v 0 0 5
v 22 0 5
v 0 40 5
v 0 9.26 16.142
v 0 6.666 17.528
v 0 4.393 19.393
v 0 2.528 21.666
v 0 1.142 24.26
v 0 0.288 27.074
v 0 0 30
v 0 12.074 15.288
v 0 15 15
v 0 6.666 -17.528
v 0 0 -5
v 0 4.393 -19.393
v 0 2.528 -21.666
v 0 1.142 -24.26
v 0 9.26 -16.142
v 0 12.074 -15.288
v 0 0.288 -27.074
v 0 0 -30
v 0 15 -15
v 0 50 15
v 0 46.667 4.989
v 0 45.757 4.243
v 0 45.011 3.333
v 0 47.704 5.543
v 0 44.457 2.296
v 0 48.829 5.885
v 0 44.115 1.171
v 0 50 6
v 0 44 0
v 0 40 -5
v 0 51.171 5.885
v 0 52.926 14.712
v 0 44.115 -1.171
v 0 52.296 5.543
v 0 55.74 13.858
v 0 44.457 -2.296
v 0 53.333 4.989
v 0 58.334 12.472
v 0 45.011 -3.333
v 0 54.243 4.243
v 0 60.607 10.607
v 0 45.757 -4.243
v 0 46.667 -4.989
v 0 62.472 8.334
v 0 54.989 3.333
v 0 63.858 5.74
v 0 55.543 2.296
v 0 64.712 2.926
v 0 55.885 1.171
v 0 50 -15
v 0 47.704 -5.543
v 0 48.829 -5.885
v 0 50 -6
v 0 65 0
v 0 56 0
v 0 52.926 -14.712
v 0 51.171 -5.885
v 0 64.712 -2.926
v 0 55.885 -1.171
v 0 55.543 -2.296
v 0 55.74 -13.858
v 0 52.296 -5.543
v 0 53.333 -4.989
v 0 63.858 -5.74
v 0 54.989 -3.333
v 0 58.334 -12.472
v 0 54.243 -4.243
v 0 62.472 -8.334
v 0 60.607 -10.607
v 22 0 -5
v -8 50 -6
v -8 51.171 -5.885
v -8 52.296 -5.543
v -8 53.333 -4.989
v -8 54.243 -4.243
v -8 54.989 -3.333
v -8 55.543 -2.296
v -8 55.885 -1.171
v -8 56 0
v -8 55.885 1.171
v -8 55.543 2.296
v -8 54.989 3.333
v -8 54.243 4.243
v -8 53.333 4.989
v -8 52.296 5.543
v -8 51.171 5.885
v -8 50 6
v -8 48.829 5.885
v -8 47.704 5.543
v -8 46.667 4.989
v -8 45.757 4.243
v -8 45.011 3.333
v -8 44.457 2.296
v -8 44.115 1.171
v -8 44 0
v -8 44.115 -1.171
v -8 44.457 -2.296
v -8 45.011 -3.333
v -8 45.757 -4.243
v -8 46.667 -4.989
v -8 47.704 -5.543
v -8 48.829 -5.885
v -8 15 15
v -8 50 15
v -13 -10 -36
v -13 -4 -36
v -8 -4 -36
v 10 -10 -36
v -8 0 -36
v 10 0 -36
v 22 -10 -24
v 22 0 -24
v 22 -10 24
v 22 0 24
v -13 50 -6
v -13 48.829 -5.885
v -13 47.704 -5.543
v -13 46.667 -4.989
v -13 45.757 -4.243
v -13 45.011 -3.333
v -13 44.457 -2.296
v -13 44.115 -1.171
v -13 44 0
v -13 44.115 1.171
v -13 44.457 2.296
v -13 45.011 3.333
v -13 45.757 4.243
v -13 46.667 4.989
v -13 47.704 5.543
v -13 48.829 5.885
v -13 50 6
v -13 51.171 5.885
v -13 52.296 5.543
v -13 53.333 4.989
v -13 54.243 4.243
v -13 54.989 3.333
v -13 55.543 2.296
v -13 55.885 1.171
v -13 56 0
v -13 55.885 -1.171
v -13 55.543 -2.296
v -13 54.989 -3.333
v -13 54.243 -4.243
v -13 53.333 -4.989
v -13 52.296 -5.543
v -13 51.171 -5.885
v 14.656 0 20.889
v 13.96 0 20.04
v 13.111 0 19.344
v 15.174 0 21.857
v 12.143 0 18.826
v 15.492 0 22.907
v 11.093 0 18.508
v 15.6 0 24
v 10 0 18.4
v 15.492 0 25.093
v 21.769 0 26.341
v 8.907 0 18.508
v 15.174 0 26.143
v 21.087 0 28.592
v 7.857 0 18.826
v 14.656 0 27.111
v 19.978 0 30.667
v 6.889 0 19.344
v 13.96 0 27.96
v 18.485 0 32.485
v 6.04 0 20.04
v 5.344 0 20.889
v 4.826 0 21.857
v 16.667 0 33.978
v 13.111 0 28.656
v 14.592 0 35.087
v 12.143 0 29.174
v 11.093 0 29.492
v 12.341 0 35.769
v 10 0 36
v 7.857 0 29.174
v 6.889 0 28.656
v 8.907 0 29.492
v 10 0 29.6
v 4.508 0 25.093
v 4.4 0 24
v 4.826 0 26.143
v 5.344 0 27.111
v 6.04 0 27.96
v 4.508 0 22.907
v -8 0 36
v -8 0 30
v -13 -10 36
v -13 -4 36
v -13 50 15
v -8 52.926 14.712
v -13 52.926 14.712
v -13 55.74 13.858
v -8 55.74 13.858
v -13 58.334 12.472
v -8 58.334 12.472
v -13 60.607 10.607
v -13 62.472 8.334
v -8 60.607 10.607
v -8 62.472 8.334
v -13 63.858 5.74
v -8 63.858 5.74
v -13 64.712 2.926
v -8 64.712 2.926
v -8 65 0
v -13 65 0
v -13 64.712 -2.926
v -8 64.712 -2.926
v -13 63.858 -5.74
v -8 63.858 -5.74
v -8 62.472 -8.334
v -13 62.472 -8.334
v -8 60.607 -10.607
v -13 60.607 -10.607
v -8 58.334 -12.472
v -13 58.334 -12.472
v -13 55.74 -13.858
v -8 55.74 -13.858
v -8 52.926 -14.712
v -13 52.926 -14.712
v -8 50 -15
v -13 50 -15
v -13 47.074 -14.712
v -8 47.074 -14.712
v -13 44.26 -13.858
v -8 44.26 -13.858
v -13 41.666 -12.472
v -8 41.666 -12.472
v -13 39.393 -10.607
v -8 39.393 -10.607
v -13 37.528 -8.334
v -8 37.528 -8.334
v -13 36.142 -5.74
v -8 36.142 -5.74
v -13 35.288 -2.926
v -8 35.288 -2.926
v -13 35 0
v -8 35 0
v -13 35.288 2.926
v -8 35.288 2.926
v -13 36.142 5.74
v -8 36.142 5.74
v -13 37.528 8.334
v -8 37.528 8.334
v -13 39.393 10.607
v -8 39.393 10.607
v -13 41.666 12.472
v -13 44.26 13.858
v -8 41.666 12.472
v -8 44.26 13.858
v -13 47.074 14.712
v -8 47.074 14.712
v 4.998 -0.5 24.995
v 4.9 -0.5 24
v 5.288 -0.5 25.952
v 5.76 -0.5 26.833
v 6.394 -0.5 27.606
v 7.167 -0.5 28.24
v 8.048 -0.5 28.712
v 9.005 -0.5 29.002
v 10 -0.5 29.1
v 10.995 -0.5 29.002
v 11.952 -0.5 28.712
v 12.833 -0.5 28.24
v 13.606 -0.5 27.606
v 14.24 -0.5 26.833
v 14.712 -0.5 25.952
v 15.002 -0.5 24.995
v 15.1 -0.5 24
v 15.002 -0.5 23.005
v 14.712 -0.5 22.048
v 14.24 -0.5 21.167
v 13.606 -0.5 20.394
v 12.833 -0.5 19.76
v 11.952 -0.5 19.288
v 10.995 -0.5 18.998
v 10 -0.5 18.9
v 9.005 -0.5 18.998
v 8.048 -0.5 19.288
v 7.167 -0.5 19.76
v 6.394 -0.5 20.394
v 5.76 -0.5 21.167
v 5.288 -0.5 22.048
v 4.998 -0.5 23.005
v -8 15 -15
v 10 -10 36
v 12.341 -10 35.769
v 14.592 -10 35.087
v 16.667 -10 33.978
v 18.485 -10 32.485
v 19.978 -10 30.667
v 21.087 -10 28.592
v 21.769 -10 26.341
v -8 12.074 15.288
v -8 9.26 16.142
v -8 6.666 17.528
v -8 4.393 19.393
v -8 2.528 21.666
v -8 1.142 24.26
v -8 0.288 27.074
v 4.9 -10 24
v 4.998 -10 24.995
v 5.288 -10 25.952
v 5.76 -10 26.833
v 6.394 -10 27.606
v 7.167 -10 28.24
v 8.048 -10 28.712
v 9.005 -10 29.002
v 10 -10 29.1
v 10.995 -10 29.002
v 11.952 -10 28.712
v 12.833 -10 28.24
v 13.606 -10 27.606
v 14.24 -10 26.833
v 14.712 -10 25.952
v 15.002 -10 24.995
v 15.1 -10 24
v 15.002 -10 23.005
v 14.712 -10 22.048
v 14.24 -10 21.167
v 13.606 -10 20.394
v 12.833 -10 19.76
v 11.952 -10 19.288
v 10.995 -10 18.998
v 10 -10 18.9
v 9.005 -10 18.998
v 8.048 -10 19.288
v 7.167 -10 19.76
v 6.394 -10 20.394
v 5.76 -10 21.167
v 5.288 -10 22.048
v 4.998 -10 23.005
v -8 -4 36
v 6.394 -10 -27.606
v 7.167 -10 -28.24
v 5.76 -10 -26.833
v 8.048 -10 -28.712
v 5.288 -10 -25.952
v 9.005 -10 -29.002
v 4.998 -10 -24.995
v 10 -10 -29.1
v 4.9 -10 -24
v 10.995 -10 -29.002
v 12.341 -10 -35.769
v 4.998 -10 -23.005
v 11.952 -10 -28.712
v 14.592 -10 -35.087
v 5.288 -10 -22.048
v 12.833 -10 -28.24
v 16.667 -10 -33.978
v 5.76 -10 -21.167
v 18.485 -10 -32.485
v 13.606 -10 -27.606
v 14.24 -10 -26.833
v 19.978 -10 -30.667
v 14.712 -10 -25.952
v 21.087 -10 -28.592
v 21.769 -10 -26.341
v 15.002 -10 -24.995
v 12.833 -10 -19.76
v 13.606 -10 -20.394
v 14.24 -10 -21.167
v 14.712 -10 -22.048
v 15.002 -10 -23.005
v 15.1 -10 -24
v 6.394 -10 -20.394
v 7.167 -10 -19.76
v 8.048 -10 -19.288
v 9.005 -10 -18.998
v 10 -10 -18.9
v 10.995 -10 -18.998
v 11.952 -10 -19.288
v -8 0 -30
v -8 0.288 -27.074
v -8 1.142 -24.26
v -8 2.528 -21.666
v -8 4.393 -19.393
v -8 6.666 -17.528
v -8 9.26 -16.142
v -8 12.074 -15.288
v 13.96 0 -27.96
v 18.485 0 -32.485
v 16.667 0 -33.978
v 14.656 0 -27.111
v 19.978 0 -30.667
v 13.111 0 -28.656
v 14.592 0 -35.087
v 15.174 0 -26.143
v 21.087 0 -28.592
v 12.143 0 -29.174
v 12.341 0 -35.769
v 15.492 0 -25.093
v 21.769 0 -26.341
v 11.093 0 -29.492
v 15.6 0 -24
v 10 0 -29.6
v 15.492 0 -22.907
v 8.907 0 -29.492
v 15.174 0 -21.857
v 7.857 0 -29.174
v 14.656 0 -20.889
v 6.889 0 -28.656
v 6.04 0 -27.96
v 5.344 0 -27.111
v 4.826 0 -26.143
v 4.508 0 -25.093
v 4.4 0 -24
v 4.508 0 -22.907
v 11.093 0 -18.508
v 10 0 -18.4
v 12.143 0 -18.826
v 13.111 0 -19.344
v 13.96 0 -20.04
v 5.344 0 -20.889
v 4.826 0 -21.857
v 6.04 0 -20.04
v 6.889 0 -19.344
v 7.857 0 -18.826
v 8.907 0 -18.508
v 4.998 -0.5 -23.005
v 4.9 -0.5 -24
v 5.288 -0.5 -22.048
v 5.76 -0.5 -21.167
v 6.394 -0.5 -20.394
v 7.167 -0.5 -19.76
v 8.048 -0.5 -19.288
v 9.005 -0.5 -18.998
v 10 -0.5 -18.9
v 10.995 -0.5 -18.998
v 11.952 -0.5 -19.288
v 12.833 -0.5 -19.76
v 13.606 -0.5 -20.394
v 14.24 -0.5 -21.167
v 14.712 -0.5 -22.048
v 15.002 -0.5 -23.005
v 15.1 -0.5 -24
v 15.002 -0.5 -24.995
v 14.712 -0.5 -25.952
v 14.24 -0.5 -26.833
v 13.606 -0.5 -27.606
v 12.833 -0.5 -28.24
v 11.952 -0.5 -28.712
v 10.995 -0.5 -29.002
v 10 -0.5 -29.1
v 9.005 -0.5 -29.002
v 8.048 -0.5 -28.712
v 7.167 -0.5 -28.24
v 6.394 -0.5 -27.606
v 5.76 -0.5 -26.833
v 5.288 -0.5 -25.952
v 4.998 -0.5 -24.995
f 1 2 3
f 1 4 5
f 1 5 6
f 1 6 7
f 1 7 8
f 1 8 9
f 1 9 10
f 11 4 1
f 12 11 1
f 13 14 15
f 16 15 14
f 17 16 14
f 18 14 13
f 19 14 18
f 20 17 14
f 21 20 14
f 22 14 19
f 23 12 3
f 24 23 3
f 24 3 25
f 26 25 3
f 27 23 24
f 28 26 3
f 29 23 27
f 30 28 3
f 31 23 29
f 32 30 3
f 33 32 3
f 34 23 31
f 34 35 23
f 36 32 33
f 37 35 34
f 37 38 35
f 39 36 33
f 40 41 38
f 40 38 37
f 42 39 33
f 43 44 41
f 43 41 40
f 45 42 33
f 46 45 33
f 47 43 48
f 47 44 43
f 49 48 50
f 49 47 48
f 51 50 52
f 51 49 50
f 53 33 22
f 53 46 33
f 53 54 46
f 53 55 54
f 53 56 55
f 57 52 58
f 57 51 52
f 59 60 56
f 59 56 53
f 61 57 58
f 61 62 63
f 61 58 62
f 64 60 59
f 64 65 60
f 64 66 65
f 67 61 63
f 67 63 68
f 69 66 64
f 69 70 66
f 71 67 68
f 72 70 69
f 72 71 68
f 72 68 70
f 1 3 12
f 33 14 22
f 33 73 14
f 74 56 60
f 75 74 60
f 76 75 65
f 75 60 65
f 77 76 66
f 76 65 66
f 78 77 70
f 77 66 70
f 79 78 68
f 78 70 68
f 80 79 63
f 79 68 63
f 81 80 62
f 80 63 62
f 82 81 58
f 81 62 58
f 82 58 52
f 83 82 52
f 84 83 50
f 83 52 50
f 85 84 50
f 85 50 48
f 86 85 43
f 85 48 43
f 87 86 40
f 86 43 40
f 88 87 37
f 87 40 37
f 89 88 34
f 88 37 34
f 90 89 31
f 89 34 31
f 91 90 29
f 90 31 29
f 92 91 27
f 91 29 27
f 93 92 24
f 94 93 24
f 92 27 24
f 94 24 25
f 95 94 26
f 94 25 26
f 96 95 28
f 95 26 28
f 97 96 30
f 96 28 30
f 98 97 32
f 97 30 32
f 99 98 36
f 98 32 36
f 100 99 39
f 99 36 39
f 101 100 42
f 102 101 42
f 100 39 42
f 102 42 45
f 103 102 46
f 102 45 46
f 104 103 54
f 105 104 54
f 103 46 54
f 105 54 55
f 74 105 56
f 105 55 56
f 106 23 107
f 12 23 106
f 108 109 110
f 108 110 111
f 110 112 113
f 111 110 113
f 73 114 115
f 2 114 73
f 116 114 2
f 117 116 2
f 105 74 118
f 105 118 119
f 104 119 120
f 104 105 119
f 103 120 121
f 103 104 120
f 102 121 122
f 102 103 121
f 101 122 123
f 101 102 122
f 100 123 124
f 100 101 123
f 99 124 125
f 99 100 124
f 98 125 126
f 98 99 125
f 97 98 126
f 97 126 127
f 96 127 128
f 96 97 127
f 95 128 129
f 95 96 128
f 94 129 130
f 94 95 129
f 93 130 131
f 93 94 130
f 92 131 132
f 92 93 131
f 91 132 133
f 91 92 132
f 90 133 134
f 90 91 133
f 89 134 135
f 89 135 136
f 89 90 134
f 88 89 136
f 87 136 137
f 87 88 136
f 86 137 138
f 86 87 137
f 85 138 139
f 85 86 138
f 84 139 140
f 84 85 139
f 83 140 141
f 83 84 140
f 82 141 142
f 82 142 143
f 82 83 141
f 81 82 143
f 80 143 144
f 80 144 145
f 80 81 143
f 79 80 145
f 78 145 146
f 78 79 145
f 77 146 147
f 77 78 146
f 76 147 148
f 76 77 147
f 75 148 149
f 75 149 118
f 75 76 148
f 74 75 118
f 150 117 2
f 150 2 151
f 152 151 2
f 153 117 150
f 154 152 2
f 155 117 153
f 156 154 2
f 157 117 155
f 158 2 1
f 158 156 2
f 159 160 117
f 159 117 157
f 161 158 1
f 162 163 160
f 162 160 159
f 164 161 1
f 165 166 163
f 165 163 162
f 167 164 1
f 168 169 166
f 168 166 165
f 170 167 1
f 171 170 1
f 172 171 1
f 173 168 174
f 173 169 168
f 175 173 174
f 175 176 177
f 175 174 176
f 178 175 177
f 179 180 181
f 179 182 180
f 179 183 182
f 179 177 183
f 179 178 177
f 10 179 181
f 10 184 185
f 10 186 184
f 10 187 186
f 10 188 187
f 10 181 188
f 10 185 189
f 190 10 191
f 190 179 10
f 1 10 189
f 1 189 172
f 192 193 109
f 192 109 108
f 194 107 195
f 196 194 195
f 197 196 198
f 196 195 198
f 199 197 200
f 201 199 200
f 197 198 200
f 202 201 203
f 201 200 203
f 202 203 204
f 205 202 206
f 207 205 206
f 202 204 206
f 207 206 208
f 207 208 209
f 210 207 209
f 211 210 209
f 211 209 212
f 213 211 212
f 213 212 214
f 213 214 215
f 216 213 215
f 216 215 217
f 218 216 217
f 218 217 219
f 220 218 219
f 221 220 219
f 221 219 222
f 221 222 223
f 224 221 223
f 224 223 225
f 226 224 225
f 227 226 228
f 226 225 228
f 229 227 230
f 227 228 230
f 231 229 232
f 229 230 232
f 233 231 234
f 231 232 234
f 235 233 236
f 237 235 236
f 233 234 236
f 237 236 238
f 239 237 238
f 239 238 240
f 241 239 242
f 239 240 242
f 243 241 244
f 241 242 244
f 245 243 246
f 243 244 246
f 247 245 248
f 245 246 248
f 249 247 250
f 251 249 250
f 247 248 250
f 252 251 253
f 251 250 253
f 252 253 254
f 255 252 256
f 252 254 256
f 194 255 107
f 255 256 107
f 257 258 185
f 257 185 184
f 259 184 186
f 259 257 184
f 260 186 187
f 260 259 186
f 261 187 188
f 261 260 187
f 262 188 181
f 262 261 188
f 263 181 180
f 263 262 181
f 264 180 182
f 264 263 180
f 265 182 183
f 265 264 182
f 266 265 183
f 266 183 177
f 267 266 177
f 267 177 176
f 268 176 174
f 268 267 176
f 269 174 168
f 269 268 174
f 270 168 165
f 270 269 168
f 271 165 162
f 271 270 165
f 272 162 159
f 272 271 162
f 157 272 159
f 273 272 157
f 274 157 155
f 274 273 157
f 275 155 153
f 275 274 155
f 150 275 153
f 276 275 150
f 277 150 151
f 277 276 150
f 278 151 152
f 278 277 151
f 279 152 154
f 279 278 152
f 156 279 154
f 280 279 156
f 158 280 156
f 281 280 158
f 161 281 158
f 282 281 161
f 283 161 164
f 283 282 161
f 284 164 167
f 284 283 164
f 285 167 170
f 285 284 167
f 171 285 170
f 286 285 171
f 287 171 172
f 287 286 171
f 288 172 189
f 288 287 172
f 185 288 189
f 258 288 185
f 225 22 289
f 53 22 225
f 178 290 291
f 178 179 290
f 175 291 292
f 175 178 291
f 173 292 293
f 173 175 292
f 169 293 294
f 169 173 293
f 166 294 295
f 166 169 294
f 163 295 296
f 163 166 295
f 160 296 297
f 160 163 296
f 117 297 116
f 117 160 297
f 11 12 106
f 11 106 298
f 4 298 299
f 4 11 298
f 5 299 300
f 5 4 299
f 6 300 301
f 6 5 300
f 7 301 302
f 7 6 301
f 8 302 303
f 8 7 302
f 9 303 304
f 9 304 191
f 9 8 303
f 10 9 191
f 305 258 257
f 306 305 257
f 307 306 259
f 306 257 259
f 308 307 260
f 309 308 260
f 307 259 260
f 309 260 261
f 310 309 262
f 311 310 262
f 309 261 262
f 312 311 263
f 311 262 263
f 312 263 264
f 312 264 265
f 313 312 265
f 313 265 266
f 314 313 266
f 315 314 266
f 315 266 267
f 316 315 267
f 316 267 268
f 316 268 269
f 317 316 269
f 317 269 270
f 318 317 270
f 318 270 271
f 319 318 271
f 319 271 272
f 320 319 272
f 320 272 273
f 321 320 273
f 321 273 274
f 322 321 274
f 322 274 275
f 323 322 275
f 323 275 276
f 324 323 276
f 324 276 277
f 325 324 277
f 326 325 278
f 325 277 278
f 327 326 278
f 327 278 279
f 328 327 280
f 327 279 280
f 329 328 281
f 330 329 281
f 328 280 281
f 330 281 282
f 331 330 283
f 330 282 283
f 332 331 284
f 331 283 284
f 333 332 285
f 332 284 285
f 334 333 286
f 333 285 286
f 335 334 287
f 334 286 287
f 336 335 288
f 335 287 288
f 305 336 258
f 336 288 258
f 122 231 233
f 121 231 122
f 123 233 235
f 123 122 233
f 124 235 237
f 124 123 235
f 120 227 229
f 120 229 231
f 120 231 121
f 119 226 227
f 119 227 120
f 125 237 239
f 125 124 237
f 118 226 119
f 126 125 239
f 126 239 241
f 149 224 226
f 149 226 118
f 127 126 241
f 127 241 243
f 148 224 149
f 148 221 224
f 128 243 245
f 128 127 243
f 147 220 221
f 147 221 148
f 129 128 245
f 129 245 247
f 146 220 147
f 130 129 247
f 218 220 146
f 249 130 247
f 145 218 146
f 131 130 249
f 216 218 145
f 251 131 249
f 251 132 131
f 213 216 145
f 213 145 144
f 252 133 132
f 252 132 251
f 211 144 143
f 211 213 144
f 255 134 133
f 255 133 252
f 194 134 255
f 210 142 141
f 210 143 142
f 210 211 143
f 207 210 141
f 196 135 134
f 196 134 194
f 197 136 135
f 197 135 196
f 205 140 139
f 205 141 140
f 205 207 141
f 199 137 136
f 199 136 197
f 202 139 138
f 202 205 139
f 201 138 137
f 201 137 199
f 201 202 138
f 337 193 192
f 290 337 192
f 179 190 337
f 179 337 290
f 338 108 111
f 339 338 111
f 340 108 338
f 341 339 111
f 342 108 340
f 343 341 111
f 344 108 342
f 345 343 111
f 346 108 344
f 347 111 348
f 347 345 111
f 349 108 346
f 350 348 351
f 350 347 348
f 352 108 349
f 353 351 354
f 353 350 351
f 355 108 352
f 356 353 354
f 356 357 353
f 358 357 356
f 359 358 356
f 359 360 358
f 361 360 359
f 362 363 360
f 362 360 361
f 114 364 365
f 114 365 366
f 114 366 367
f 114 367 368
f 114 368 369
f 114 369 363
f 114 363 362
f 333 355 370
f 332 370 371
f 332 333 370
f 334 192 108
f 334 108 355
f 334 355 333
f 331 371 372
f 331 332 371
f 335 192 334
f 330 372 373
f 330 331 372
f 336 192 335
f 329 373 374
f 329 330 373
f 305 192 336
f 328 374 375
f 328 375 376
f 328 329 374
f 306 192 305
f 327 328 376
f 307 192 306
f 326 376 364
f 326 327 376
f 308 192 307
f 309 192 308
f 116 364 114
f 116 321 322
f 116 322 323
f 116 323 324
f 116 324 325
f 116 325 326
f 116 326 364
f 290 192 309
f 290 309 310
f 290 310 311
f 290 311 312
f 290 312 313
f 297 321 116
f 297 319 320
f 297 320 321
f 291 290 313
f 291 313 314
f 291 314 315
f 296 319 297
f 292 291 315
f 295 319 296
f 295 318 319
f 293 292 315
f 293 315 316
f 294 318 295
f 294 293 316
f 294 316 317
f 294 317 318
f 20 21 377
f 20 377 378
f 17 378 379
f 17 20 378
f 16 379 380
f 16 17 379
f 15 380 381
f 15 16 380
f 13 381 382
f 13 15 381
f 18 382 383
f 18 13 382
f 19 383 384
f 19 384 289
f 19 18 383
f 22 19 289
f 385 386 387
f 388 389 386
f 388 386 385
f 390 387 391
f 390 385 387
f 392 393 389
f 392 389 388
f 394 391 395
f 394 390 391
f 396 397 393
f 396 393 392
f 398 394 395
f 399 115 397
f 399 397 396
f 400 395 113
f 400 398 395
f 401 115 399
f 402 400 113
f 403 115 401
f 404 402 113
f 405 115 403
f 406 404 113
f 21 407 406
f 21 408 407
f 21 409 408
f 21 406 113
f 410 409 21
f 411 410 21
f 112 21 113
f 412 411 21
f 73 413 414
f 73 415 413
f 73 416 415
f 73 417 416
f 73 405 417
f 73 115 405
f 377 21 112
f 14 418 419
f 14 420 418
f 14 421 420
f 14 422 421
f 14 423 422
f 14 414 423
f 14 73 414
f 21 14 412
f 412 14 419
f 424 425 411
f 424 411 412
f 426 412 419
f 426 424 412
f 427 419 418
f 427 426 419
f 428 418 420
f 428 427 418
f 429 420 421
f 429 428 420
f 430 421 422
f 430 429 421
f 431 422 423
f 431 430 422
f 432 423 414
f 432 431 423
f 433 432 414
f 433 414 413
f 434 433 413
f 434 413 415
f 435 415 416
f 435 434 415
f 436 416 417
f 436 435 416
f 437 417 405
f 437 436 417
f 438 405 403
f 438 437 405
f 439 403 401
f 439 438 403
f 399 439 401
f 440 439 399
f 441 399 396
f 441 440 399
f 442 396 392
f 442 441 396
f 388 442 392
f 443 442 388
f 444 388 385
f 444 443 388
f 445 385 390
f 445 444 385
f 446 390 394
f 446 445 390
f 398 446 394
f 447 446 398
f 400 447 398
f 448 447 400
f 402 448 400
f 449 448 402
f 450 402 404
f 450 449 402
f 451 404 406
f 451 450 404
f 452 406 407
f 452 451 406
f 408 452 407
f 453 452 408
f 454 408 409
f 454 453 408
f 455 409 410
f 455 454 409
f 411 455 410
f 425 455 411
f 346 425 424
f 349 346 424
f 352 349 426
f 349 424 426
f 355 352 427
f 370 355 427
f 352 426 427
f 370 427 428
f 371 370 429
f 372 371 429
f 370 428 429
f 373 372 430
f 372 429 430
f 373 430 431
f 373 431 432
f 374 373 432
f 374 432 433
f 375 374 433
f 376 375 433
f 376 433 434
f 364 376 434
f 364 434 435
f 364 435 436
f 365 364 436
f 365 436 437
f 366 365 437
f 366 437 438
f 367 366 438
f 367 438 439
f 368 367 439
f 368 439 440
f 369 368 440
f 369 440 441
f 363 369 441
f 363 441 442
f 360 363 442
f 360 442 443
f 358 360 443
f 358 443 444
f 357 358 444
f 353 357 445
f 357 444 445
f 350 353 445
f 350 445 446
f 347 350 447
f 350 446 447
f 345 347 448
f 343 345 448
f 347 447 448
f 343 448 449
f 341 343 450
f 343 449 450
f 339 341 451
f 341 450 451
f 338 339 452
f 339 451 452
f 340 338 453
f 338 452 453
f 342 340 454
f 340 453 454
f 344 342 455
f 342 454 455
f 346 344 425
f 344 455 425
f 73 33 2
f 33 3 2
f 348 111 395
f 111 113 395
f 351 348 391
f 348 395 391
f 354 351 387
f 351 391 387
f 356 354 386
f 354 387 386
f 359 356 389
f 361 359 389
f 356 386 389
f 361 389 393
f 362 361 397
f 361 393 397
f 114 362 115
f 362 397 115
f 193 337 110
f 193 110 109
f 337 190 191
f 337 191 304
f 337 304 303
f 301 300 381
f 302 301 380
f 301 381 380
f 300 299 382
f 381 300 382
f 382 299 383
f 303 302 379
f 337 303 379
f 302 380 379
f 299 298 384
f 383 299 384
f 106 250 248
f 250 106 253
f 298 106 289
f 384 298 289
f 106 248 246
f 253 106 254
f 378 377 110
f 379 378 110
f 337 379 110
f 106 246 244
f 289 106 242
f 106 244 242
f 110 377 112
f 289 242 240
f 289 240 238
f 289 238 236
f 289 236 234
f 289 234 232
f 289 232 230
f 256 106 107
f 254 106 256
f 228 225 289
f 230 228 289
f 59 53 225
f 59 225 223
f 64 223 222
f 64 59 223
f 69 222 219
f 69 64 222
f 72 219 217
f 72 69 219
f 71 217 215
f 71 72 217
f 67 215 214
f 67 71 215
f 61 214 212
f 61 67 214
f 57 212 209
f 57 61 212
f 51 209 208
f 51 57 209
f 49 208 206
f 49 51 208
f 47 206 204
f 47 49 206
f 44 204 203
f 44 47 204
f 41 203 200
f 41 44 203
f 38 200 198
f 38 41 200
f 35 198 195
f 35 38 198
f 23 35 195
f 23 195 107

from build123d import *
from build123d.topology import SkipClean

# Parameters (mm, degrees)
BOSS_EXTRUDE3_DEPTH = 5
BOSS_EXTRUDE4_DEPTH = 36
SKETCH5_R           = 6
BOSS_EXTRUDE5_DEPTH = 8
SKETCH6_R           = 15
SKETCH6_R_2         = 6
BOSS_EXTRUDE6_DEPTH = 5
FILLET1_R           = 12
SKETCH8_R           = 5.1
CUT_EXTRUDE1_DEPTH  = 78.491935064
CHAMFER1_SIZE       = 0.5


with BuildPart() as part:
    # Sketch3 → Boss-Extrude3 (new, symmetric)
    with BuildSketch(Plane.XY):
        Polygon((0, 0), (0, 40), (22, 0), align=None)
    extrude(amount=BOSS_EXTRUDE3_DEPTH, both=True)

    # Sketch4 → Boss-Extrude4 (add, symmetric)
    with BuildSketch(Plane.XY):
        Polygon((22, 0), (-8, 0), (-8, -4), (-13, -4), (-13, -10), (22, -10), align=None)
    extrude(amount=BOSS_EXTRUDE4_DEPTH, both=True)

    # Sketch5 → Boss-Extrude5 (add)
    with BuildSketch(Plane(origin=(0, 0, 0), x_dir=(0, 0, -1), z_dir=(1, 0, 0))):
        with BuildLine():
            Line((-30, 0), (30, 0))
            ThreePointArc((30, 0), (19.393398282, 4.393398282), (15, 15))
            Line((15, 15), (15, 50))
            ThreePointArc((15, 50), (0, 65), (-15, 50))
            Line((-15, 50), (-15, 15))
            ThreePointArc((-15, 15), (-19.393398282, 4.393398282), (-30, 0))
        make_face()
        with Locations((0, 50)):
            Circle(SKETCH5_R, mode=Mode.SUBTRACT)
    extrude(amount=-BOSS_EXTRUDE5_DEPTH)

    # Sketch6 → Boss-Extrude6 (add)
    with SkipClean():  # the faces are left unmerged after this step: merging them gives an invalid solid
        with BuildSketch(Plane.ZY.offset(8)):
            with Locations((0, 50)):
                Circle(SKETCH6_R)
            with Locations((0, 50)):
                Circle(SKETCH6_R_2, mode=Mode.SUBTRACT)
        extrude(amount=BOSS_EXTRUDE6_DEPTH)
    add(part.part.scale(1), mode=Mode.REPLACE)  # the faces are merged on a copy

    # Fillet1
    fillet1_edges = [part.edges().sort_by_distance(p)[0] for p in [
        (22, -5, 36),
        (22, -5, -36),
    ]]
    fillet(fillet1_edges, radius=FILLET1_R)

    # Sketch8 → Cut-Extrude1 (cut, through all)
    with SkipClean():  # the faces are left unmerged after this step: merging them gives an invalid solid
        with BuildSketch(Plane(origin=(0, 0, 0), x_dir=(1, 0, 0), z_dir=(0, 1, 0))):
            with Locations((10, 24)):
                Circle(SKETCH8_R)
            with Locations((10, -24)):
                Circle(SKETCH8_R)
        extrude(amount=-CUT_EXTRUDE1_DEPTH, mode=Mode.SUBTRACT)

    # Chamfer1
    chamfer1_edges = [part.edges().sort_by_distance(p)[0] for p in [
        (4.9, 0, -24),
        (4.9, 0, 24),
    ]]
    chamfer(chamfer1_edges, length=CHAMFER1_SIZE)


solid = part.part
